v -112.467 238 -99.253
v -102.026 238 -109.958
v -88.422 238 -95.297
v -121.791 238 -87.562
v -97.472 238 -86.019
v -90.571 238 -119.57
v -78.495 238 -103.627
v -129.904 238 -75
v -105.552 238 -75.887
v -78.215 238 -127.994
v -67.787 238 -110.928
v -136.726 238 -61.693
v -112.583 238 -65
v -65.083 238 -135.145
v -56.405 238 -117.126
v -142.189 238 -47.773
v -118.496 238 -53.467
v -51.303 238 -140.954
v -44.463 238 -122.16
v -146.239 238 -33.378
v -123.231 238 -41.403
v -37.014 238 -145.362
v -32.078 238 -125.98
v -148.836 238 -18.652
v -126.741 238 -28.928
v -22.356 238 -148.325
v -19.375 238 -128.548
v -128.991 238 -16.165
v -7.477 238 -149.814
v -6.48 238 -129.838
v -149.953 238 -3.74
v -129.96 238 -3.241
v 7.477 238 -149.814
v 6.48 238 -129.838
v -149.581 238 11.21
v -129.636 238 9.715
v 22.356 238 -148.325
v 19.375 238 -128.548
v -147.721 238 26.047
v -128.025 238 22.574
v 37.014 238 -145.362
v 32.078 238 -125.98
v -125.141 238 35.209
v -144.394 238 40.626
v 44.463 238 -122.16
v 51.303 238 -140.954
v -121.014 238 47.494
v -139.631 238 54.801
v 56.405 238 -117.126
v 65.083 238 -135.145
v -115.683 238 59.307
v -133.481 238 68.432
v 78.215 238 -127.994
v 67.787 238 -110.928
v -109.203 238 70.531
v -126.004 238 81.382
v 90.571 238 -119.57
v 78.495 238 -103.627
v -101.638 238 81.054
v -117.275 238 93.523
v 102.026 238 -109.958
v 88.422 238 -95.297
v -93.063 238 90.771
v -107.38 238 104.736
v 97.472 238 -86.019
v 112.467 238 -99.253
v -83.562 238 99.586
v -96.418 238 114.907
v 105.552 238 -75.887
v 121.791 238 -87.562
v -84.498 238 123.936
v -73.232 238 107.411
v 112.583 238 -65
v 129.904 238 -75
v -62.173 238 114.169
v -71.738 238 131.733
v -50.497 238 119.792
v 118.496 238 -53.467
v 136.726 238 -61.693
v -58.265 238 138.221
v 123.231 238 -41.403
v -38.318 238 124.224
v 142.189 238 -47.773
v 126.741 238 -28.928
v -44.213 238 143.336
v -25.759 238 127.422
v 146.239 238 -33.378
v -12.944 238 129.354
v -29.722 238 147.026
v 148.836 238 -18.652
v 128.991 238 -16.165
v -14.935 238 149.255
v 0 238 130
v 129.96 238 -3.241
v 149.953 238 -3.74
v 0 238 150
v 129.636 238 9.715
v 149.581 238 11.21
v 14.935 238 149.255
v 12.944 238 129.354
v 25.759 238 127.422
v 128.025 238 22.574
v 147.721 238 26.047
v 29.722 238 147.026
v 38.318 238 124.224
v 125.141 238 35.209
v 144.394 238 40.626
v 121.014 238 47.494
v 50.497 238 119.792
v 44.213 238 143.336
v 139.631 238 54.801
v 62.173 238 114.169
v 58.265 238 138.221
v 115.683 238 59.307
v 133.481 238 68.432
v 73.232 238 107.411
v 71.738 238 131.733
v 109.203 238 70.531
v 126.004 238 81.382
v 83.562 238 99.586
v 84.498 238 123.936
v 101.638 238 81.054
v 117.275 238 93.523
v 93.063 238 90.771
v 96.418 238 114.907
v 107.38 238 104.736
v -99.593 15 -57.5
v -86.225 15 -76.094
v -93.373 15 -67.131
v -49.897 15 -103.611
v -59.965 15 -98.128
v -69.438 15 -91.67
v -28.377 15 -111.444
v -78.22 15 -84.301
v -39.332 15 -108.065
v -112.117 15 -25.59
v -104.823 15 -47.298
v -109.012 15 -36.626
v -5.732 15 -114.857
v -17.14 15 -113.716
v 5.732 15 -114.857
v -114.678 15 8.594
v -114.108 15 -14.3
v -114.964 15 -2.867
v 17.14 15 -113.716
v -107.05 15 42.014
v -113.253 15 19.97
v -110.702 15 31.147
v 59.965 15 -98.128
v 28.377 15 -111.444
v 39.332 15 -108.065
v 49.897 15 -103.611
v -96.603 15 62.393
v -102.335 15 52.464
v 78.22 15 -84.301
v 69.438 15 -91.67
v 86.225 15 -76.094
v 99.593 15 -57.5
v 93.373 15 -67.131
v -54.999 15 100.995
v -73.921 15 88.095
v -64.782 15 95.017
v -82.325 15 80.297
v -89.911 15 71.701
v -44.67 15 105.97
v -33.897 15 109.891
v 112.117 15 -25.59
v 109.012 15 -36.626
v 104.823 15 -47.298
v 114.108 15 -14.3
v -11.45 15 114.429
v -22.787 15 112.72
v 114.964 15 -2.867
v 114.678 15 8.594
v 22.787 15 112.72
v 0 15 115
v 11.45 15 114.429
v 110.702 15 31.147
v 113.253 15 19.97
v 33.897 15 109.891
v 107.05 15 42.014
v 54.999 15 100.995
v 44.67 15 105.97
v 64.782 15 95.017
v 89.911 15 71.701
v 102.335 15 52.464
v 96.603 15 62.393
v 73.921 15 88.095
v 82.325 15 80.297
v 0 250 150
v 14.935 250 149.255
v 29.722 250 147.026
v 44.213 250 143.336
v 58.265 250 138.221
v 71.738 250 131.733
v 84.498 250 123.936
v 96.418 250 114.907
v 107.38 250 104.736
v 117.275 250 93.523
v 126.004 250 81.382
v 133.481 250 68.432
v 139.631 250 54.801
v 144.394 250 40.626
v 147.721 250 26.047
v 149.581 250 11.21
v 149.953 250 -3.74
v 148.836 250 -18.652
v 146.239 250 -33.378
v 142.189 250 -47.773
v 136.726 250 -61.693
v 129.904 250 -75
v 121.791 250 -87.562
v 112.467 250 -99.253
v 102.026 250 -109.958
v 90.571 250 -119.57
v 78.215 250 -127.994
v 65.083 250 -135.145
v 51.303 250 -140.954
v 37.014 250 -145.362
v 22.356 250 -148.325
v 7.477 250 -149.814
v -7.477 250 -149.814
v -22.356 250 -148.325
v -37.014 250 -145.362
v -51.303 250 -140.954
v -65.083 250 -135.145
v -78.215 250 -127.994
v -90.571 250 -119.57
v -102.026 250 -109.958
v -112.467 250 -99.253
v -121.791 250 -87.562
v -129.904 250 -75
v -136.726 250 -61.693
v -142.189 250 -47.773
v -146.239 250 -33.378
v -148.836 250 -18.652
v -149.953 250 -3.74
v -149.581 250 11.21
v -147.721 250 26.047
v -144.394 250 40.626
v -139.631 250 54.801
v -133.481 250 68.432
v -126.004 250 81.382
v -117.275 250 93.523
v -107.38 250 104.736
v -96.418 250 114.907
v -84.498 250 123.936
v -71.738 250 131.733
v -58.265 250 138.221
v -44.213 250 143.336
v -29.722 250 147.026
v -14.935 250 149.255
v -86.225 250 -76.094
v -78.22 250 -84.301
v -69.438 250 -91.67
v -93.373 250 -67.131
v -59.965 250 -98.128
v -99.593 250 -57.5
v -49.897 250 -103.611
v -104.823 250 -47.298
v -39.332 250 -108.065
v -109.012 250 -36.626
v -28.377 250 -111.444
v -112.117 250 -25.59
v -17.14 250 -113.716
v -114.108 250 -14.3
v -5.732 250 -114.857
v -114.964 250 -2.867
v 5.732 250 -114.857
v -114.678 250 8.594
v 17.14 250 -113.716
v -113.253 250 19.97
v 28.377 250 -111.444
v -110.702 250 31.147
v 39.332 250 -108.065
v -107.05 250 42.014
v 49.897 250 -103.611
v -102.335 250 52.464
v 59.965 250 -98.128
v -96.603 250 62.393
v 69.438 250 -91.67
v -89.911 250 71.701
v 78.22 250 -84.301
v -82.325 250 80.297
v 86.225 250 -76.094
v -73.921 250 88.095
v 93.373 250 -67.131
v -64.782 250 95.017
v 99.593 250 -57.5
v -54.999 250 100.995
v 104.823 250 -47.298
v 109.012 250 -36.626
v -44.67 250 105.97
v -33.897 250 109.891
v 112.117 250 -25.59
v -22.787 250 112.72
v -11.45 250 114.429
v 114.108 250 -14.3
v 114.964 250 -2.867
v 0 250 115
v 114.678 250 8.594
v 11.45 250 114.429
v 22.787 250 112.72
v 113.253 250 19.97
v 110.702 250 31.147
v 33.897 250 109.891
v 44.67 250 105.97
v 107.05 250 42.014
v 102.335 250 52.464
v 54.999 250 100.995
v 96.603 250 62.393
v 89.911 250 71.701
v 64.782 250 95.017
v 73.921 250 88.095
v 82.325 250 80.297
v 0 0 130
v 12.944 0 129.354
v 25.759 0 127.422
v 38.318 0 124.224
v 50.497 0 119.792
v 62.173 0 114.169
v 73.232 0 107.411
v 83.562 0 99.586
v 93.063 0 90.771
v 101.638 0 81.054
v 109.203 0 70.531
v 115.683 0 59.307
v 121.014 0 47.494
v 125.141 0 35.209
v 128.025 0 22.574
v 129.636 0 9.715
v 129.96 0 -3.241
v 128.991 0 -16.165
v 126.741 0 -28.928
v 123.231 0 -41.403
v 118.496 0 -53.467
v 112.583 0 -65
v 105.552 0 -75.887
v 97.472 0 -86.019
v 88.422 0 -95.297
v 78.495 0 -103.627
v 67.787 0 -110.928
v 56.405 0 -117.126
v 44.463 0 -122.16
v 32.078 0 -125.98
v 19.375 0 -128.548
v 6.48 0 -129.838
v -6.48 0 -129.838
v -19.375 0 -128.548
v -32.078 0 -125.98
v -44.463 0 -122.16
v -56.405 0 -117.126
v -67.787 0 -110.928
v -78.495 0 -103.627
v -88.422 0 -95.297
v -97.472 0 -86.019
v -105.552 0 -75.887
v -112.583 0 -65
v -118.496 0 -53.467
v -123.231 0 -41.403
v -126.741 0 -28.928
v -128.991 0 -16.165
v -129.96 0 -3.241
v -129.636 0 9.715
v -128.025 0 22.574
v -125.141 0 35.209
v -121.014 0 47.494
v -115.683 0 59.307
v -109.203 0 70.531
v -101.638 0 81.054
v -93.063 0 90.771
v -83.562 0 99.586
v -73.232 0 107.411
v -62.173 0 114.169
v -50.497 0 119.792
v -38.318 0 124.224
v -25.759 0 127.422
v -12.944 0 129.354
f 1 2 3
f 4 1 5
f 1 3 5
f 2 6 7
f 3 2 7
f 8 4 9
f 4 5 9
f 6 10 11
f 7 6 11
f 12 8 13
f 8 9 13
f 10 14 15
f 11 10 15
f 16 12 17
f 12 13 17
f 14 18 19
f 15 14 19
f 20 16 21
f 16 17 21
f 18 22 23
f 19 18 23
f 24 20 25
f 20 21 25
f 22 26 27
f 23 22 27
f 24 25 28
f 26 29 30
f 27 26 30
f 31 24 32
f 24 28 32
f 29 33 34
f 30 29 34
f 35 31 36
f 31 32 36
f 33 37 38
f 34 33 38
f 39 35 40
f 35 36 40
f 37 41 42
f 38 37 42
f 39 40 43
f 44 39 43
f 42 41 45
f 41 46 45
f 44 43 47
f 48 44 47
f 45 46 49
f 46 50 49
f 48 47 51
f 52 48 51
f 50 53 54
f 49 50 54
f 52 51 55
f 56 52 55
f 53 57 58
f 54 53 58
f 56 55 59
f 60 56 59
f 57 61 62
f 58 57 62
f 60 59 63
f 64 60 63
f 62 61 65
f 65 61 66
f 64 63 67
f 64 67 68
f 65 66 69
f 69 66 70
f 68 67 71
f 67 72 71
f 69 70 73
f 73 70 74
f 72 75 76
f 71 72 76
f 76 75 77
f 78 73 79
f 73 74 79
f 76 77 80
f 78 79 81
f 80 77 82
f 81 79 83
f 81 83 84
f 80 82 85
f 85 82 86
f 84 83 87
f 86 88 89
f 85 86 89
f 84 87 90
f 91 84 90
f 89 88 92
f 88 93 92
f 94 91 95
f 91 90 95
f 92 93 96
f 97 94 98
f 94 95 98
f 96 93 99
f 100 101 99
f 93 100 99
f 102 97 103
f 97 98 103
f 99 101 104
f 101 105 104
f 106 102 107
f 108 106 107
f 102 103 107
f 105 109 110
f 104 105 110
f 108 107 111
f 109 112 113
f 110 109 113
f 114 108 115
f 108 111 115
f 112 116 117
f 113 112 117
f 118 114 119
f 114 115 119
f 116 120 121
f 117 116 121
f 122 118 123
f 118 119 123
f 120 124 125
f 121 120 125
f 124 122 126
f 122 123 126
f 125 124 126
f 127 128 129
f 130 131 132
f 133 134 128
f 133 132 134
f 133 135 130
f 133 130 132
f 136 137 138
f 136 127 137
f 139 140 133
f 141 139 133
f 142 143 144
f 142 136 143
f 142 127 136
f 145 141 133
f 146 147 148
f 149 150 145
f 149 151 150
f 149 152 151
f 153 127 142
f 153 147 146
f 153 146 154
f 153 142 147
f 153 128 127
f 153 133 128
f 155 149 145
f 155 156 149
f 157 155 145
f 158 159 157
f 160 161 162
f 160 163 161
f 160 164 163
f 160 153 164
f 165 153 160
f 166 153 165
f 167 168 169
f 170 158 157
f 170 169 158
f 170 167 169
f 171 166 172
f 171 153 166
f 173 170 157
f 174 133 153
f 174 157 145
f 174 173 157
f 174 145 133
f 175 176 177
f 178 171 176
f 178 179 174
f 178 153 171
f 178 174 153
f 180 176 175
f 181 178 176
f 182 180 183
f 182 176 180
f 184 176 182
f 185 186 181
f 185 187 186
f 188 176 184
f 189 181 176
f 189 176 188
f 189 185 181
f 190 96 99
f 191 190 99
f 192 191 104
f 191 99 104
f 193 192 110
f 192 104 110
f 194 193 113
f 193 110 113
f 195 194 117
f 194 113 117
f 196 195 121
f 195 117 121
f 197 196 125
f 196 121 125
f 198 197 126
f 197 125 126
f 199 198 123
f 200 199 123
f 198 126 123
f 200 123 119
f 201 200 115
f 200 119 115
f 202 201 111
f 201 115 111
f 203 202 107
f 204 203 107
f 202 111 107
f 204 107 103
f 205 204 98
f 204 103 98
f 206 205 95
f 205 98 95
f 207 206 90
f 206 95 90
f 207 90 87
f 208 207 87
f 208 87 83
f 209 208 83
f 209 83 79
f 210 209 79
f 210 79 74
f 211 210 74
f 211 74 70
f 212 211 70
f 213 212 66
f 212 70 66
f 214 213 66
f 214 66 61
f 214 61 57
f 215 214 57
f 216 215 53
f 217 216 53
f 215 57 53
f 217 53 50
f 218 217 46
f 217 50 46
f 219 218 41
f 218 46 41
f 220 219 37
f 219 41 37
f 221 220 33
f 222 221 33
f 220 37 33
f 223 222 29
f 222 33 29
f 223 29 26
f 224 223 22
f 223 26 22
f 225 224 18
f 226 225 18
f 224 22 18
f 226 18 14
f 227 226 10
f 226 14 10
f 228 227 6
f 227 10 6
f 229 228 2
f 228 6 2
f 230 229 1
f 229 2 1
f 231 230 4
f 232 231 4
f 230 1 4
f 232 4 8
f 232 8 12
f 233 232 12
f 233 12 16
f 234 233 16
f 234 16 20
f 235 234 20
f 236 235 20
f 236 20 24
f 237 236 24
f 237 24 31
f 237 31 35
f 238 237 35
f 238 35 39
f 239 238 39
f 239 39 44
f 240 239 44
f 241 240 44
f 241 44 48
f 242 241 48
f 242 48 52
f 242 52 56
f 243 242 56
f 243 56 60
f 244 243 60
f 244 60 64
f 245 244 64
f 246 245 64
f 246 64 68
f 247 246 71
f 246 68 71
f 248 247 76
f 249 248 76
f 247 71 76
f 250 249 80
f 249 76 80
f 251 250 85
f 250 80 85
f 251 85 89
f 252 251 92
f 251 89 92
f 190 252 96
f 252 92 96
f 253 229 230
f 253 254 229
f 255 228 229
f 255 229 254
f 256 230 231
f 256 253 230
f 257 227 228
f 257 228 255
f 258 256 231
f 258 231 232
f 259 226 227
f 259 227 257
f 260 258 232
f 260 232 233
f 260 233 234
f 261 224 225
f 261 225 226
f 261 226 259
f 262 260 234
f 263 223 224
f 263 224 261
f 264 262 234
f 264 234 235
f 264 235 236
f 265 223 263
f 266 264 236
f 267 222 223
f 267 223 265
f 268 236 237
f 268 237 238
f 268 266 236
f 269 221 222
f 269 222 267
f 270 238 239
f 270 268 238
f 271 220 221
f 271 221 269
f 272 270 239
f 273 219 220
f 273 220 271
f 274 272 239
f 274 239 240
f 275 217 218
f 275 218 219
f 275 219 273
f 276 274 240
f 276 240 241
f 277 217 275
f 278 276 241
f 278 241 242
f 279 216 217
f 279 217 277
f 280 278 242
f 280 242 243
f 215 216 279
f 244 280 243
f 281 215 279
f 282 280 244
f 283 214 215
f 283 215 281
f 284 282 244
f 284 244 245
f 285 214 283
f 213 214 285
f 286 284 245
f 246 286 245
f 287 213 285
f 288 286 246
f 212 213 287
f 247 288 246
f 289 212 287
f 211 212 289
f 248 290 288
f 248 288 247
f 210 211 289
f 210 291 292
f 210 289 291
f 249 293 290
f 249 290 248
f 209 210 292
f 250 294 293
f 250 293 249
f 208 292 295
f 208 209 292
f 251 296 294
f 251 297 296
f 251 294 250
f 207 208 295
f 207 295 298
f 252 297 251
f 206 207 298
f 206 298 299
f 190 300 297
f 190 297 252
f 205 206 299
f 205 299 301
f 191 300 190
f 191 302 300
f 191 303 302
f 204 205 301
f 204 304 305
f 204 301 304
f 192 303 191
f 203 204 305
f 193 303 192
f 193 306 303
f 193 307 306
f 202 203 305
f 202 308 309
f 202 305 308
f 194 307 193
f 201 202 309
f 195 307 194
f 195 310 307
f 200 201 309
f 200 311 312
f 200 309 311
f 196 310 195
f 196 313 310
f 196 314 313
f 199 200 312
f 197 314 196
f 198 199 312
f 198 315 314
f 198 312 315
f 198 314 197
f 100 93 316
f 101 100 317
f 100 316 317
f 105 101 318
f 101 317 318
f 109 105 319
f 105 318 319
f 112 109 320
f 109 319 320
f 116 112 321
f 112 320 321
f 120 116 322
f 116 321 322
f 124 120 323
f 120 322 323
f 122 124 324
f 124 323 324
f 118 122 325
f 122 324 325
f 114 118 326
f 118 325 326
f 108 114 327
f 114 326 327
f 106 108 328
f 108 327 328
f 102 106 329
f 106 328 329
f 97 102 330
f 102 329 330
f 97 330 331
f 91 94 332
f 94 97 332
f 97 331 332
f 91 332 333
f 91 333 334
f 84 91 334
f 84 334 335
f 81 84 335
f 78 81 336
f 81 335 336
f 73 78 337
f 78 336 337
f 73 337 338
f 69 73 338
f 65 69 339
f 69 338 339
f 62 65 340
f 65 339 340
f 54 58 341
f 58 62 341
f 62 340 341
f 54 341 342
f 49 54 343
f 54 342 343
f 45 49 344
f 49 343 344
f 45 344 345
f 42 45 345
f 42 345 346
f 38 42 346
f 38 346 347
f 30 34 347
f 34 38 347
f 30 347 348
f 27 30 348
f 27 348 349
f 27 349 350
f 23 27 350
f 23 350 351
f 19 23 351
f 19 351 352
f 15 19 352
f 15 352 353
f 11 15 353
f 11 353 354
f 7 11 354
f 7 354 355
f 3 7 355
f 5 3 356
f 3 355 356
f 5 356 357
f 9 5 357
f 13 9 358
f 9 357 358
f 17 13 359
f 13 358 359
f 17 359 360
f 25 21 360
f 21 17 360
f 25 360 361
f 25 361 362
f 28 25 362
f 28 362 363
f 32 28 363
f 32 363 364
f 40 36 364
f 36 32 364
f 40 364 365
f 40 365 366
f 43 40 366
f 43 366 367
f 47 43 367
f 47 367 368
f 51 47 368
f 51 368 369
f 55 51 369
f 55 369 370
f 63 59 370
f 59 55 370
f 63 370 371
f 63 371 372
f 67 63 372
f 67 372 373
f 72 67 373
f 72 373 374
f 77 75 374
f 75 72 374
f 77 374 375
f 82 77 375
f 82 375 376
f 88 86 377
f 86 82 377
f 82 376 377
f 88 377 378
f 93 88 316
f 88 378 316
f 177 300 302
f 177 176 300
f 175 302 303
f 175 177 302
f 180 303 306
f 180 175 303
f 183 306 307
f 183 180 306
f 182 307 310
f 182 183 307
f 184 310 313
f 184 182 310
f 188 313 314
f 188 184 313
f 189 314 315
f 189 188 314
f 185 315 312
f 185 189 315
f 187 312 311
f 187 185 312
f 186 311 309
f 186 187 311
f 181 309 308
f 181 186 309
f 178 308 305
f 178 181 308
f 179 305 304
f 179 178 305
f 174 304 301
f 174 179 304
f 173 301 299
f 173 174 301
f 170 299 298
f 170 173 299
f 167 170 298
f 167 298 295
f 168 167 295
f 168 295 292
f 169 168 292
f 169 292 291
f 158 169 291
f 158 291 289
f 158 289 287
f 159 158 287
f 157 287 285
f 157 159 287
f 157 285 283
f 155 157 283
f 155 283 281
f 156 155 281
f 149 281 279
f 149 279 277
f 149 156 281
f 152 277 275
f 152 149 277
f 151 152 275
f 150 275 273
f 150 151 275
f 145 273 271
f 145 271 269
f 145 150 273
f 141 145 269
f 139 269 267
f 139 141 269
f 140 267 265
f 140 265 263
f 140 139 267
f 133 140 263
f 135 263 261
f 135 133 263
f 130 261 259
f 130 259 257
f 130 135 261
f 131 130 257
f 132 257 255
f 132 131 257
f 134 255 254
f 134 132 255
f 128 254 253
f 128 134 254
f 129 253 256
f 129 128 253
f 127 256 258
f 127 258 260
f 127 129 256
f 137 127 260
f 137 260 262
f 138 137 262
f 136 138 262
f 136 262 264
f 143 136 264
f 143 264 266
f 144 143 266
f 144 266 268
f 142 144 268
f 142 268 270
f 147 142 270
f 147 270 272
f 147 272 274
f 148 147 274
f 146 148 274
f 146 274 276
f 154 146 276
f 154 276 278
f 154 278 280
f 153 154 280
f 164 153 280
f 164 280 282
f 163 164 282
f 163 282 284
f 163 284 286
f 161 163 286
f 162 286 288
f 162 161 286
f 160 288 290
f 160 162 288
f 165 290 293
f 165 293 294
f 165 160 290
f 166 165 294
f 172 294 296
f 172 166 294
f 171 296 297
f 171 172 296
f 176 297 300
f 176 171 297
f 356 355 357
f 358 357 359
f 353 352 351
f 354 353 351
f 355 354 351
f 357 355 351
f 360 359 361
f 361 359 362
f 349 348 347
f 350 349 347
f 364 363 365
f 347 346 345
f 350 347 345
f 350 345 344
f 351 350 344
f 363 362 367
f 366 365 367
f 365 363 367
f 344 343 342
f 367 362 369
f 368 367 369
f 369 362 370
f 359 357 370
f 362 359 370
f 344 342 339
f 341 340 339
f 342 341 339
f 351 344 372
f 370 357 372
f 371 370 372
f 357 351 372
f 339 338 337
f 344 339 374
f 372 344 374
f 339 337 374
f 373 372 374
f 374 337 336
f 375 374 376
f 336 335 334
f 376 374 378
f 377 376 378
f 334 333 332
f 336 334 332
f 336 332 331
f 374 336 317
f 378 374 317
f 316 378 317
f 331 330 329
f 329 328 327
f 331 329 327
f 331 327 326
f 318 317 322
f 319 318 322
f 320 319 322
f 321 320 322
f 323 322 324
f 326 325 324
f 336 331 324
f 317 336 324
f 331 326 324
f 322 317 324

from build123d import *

# Parameters (mm, degrees)
POT_BASE_SKETCH_R   = 130
POT_BASE_DEPTH      = 15
POT_WALL_SKETCH_R   = 130
POT_WALL_SKETCH_R_2 = 115
POT_WALL_DEPTH      = 250
POT_START           = 238
POT_RIM_SKETCH_R    = 150
POT_RIM_SKETCH_R_2  = 115
POT_RIM_DEPTH       = 12


with BuildPart() as part:
    # Pot Base Sketch → Pot Base (new body)
    with BuildSketch(Plane(origin=(0, 0, 0), x_dir=(1, 0, 0), z_dir=(0, 1, 0))):
        with Locations(Location((0, 0, 0), (0, 0, 270))):
            Circle(POT_BASE_SKETCH_R)
    extrude(amount=POT_BASE_DEPTH)

    # Pot Wall Sketch → Pot Wall (add)
    with BuildSketch(Plane(origin=(0, 0, 0), x_dir=(1, 0, 0), z_dir=(0, 1, 0))):
        with Locations(Location((0, 0, 0), (0, 0, 270))):
            Circle(POT_WALL_SKETCH_R)
        with Locations(Location((0, 0, 0), (0, 0, 270))):
            Circle(POT_WALL_SKETCH_R_2, mode=Mode.SUBTRACT)
    extrude(amount=POT_WALL_DEPTH)

    # Pot Rim Sketch → Pot Rim (add)
    with BuildSketch(Plane(origin=(0, 0, 0), x_dir=(1, 0, 0), z_dir=(0, 1, 0)).offset(POT_START)):
        with Locations(Location((0, 0, 0), (0, 0, 270))):
            Circle(POT_RIM_SKETCH_R)
        with Locations(Location((0, 0, 0), (0, 0, 270))):
            Circle(POT_RIM_SKETCH_R_2, mode=Mode.SUBTRACT)
    extrude(amount=POT_RIM_DEPTH)


solid = part.part
